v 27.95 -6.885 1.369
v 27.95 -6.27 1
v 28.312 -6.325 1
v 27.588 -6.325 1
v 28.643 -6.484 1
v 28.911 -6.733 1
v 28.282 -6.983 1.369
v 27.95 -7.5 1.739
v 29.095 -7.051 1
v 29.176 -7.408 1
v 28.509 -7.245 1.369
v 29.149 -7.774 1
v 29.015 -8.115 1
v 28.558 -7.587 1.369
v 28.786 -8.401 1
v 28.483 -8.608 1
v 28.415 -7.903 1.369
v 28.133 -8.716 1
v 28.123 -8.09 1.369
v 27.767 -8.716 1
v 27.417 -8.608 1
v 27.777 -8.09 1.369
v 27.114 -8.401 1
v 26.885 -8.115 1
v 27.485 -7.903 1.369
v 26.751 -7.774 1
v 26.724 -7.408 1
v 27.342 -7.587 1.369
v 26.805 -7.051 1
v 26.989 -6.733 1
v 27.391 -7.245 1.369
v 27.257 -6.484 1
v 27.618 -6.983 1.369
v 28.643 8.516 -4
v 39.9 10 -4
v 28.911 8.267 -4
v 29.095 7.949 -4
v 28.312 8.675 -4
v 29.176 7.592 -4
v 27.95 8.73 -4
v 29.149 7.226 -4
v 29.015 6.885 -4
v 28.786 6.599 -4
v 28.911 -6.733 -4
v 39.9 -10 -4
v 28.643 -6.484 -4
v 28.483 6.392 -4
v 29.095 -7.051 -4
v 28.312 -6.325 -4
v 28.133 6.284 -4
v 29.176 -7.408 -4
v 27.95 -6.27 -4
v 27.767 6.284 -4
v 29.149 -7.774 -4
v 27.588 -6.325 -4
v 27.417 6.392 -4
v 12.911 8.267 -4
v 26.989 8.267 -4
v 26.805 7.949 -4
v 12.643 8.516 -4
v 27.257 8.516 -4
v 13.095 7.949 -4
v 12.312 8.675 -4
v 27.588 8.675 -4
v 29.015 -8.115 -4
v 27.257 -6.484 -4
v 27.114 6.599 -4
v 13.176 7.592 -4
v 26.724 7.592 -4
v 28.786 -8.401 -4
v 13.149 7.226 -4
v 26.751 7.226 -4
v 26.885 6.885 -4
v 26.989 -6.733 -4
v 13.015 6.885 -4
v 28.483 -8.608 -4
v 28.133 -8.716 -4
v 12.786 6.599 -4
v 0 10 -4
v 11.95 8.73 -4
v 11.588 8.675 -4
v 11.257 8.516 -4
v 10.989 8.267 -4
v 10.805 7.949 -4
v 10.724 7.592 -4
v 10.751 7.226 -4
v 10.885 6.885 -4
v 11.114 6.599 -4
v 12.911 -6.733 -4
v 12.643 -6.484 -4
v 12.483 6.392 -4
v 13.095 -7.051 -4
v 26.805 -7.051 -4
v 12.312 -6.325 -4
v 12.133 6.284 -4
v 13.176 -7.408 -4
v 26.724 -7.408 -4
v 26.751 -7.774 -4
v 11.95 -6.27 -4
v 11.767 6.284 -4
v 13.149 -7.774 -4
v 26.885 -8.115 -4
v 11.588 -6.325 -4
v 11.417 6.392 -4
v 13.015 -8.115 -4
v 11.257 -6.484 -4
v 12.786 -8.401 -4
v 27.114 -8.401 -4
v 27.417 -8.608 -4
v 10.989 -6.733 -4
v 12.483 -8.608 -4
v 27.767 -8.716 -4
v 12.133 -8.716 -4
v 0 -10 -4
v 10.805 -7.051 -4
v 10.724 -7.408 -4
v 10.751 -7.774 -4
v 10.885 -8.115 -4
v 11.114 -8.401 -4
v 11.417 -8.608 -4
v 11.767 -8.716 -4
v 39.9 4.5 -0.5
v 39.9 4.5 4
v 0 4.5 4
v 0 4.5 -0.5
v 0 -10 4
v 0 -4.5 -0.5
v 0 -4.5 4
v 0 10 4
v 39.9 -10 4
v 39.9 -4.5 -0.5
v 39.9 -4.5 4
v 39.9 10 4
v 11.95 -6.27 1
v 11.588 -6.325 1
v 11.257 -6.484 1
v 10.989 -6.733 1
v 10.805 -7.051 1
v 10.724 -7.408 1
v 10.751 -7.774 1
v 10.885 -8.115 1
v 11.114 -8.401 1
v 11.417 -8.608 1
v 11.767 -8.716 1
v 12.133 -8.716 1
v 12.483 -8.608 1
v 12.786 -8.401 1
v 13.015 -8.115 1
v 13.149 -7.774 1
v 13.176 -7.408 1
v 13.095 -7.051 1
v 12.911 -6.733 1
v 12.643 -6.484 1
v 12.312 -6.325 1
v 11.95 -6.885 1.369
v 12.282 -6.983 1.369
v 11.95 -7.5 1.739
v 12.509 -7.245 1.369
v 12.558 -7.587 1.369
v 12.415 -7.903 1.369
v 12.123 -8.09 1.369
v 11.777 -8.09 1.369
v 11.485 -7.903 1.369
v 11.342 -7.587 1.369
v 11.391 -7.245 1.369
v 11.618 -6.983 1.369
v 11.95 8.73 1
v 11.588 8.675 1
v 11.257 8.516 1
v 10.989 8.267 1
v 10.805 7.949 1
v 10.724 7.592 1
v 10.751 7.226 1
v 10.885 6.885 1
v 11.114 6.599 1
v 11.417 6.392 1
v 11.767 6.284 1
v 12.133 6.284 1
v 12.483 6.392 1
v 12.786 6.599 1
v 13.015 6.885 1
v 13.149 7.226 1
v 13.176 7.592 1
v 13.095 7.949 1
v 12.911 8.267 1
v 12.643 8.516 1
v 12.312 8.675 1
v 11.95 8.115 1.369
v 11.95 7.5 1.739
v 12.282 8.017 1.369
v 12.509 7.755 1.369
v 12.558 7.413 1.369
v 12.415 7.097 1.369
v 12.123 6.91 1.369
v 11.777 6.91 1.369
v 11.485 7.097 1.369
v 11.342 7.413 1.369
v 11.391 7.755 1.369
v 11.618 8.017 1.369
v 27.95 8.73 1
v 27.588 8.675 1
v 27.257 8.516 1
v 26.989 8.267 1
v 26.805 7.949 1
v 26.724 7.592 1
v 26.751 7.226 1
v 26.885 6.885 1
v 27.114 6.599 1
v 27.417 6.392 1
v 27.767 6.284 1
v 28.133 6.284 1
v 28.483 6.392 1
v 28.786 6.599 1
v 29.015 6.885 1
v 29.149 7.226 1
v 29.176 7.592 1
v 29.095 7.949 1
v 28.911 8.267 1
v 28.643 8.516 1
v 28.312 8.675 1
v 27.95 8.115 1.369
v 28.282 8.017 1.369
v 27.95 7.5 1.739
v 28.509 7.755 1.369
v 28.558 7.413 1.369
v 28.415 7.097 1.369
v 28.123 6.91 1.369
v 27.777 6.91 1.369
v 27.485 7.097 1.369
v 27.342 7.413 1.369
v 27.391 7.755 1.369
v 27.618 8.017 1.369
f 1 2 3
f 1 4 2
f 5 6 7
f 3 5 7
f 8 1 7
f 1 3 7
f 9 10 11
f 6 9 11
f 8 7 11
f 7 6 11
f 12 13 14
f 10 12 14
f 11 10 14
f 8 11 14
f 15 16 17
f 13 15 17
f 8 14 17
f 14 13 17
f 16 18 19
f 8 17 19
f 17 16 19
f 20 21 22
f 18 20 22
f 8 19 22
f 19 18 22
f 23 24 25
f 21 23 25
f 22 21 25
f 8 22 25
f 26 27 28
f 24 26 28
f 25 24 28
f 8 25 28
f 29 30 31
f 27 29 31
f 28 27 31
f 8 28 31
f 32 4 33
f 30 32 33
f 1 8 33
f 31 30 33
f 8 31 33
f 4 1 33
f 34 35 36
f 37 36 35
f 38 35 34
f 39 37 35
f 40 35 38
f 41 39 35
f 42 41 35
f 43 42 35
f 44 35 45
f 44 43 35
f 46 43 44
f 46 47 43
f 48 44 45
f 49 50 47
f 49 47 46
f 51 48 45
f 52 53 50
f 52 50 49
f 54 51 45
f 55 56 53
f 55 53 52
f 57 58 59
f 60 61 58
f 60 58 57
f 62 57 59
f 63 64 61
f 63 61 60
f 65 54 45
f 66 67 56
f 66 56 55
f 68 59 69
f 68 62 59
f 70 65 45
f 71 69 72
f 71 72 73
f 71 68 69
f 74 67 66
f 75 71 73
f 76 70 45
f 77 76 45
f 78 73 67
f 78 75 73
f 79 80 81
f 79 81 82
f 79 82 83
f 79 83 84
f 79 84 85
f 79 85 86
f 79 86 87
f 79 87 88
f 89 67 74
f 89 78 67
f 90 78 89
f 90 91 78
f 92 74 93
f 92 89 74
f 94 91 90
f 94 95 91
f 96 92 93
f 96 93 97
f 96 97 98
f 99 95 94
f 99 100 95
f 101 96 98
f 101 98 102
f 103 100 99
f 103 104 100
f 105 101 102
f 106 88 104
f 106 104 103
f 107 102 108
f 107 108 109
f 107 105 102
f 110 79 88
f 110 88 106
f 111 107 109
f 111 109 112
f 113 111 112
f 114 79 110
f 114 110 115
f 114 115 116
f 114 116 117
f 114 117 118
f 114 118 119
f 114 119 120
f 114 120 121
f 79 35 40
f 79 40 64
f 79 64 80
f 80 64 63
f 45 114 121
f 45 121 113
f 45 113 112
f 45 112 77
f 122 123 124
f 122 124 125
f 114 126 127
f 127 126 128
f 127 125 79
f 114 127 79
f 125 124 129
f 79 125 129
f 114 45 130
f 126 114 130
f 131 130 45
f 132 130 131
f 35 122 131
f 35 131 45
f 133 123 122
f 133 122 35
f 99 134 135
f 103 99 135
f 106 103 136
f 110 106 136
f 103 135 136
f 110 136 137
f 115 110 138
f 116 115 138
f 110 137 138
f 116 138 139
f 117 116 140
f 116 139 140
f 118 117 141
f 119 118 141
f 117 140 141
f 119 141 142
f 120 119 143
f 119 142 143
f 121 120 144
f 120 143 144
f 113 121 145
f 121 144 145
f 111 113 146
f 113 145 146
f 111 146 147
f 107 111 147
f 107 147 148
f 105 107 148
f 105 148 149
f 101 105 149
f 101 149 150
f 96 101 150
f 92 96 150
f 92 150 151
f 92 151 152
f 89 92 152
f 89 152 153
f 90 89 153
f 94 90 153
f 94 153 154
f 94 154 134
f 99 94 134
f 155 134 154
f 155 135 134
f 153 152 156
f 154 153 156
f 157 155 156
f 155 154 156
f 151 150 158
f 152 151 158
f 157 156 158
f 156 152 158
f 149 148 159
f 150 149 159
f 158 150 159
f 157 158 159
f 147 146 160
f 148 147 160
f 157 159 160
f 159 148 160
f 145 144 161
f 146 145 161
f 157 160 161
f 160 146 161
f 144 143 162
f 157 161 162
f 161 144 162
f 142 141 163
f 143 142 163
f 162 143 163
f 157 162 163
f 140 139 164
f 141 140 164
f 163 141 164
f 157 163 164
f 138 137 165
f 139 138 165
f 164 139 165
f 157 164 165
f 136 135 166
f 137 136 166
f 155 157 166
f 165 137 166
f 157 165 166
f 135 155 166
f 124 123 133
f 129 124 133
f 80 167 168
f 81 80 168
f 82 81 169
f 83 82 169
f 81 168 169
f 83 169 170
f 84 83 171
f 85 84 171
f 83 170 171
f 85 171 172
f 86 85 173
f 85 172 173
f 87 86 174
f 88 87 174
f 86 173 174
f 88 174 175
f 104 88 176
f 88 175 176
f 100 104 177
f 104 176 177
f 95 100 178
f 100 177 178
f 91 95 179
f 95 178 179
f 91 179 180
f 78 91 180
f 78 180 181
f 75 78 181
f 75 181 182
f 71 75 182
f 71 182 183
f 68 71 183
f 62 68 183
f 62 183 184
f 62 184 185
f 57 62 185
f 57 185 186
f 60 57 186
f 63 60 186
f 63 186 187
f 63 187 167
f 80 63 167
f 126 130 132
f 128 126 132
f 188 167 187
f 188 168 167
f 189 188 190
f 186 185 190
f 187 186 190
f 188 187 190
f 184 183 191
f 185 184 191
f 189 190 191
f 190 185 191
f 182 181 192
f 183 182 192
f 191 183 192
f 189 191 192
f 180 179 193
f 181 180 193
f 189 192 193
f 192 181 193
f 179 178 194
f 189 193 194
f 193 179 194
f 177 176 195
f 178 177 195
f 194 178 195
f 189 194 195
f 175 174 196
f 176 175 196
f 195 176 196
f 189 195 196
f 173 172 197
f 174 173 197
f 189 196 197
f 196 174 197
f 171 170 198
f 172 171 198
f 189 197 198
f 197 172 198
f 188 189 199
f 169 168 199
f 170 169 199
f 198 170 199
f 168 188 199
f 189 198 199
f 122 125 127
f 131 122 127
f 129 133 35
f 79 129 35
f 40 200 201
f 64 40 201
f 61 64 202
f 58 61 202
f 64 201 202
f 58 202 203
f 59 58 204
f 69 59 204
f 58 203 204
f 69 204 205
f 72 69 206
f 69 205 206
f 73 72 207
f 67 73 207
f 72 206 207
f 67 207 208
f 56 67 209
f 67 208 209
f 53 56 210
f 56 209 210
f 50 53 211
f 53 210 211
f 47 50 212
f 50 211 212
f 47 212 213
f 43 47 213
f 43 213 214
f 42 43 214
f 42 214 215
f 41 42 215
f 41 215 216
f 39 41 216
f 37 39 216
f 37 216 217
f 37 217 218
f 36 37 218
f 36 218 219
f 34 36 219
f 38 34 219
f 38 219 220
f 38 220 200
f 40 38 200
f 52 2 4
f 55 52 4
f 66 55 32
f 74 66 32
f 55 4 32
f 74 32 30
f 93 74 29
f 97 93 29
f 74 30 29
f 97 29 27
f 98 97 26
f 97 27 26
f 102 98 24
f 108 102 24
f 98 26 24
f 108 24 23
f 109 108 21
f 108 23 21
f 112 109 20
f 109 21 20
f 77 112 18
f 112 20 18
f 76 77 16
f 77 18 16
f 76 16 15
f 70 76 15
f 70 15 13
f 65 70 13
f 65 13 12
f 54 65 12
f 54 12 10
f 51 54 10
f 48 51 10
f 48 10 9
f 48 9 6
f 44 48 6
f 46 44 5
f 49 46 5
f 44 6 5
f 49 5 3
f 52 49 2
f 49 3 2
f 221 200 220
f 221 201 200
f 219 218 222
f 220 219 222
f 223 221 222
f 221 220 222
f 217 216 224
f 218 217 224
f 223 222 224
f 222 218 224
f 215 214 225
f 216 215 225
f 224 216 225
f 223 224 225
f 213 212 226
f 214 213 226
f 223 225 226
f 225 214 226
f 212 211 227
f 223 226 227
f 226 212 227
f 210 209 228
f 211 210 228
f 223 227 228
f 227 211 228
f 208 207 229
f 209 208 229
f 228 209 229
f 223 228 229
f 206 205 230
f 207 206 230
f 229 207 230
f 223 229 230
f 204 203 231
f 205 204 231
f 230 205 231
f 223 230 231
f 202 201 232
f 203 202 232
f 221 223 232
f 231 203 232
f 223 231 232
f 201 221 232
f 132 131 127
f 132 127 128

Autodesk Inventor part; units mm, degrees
ref_plane "YZ Plane" through (0, 0, 0) normal (1, 0, 0) x (0, 1, 0)
ref_plane "XZ Plane" through (0, 0, 0) normal (0, 1, 0) x (-1, 0, 0)
ref_plane "XY Plane" through (0, 0, 0) normal (0, 0, 1) x (1, 0, 0)
sketch "Sketch1" plane through (0, 0, 0) normal (1, 0, 0) x (0, 1, 0)
  line L0 (-10, 4) -> (10, 4)
  line L1 (10, 4) -> (10, -4)
  line L2 (10, -4) -> (-10, -4)
  line L3 (-10, -4) -> (-10, 4)
  line L4 (-10, 4) -> (10, -4) construction
  line L5 (10, 4) -> (-10, -4) construction
  point P0 (0, 0)
  dimension "d0" = 8
  dimension "d1" = 20
extrude "Extrusion1" add sketch "Sketch1" along normal blind 39.9
sketch "Sketch2" plane through (39.9, 0, 0) normal (1, 0, 0) x (0, 0, -1)
  line L0 (-4, 10) -> (-4, -10) projected
  line L1 (-4, 4.5) -> (0.5, 4.5)
  line L2 (0.5, 4.5) -> (0.5, -4.5)
  line L3 (0.5, -4.5) -> (-4, -4.5)
  line L4 (-4, -4.5) -> (-4, 4.5)
  point P0 (0, 0)
  dimension "d4" = 9
  dimension "d5" = 4.5
  dimension "d6" = 4.5
extrude "Extrusion2" cut sketch "Sketch2" against normal blind 39.9
sketch "Sketch3" plane through (0, -10, -4) normal (0, 0, -1) x (-1, 0, 0)
  line L0 (0, 20) -> (0, 0) projected
  line L1 (0, 20) -> (-39.9, 20) projected
  line L2 (-39.9, 0) -> (-39.9, 20) projected
  line L3 (0, 0) -> (-39.9, 0) projected
  point P0 (0, 10)
  point P1 (-27.95, 17.5)
  point P2 (-27.95, 2.5)
  point P3 (-11.95, 2.5)
  point P4 (-11.95, 17.5)
  dimension "d9" = 16
  dimension "d10" = 39.9
  dimension "d11" = 11.95
  dimension "d12" = 15
  dimension "d13" = 7.5
hole "Hole1" at (27.95, 7.5, -4) at (27.95, -7.5, -4) at (11.95, -7.5, -4) at (11.95, 7.5, -4) direction (0, 0, 1) diameter 2.459 depth 5 tip angle 118 thread size "M3x0.5" class "6H" standard "ISO Metric profile"
equation "\"d5\" = 0.5 * d4"
equation "\"d11\" = 0.5 * d10 - 0.5 * d9"
equation "\"d13\" = 0.5 * d12"
properties part number "MGN9H" material "Stainless Steel AISI 440C, Welded"
